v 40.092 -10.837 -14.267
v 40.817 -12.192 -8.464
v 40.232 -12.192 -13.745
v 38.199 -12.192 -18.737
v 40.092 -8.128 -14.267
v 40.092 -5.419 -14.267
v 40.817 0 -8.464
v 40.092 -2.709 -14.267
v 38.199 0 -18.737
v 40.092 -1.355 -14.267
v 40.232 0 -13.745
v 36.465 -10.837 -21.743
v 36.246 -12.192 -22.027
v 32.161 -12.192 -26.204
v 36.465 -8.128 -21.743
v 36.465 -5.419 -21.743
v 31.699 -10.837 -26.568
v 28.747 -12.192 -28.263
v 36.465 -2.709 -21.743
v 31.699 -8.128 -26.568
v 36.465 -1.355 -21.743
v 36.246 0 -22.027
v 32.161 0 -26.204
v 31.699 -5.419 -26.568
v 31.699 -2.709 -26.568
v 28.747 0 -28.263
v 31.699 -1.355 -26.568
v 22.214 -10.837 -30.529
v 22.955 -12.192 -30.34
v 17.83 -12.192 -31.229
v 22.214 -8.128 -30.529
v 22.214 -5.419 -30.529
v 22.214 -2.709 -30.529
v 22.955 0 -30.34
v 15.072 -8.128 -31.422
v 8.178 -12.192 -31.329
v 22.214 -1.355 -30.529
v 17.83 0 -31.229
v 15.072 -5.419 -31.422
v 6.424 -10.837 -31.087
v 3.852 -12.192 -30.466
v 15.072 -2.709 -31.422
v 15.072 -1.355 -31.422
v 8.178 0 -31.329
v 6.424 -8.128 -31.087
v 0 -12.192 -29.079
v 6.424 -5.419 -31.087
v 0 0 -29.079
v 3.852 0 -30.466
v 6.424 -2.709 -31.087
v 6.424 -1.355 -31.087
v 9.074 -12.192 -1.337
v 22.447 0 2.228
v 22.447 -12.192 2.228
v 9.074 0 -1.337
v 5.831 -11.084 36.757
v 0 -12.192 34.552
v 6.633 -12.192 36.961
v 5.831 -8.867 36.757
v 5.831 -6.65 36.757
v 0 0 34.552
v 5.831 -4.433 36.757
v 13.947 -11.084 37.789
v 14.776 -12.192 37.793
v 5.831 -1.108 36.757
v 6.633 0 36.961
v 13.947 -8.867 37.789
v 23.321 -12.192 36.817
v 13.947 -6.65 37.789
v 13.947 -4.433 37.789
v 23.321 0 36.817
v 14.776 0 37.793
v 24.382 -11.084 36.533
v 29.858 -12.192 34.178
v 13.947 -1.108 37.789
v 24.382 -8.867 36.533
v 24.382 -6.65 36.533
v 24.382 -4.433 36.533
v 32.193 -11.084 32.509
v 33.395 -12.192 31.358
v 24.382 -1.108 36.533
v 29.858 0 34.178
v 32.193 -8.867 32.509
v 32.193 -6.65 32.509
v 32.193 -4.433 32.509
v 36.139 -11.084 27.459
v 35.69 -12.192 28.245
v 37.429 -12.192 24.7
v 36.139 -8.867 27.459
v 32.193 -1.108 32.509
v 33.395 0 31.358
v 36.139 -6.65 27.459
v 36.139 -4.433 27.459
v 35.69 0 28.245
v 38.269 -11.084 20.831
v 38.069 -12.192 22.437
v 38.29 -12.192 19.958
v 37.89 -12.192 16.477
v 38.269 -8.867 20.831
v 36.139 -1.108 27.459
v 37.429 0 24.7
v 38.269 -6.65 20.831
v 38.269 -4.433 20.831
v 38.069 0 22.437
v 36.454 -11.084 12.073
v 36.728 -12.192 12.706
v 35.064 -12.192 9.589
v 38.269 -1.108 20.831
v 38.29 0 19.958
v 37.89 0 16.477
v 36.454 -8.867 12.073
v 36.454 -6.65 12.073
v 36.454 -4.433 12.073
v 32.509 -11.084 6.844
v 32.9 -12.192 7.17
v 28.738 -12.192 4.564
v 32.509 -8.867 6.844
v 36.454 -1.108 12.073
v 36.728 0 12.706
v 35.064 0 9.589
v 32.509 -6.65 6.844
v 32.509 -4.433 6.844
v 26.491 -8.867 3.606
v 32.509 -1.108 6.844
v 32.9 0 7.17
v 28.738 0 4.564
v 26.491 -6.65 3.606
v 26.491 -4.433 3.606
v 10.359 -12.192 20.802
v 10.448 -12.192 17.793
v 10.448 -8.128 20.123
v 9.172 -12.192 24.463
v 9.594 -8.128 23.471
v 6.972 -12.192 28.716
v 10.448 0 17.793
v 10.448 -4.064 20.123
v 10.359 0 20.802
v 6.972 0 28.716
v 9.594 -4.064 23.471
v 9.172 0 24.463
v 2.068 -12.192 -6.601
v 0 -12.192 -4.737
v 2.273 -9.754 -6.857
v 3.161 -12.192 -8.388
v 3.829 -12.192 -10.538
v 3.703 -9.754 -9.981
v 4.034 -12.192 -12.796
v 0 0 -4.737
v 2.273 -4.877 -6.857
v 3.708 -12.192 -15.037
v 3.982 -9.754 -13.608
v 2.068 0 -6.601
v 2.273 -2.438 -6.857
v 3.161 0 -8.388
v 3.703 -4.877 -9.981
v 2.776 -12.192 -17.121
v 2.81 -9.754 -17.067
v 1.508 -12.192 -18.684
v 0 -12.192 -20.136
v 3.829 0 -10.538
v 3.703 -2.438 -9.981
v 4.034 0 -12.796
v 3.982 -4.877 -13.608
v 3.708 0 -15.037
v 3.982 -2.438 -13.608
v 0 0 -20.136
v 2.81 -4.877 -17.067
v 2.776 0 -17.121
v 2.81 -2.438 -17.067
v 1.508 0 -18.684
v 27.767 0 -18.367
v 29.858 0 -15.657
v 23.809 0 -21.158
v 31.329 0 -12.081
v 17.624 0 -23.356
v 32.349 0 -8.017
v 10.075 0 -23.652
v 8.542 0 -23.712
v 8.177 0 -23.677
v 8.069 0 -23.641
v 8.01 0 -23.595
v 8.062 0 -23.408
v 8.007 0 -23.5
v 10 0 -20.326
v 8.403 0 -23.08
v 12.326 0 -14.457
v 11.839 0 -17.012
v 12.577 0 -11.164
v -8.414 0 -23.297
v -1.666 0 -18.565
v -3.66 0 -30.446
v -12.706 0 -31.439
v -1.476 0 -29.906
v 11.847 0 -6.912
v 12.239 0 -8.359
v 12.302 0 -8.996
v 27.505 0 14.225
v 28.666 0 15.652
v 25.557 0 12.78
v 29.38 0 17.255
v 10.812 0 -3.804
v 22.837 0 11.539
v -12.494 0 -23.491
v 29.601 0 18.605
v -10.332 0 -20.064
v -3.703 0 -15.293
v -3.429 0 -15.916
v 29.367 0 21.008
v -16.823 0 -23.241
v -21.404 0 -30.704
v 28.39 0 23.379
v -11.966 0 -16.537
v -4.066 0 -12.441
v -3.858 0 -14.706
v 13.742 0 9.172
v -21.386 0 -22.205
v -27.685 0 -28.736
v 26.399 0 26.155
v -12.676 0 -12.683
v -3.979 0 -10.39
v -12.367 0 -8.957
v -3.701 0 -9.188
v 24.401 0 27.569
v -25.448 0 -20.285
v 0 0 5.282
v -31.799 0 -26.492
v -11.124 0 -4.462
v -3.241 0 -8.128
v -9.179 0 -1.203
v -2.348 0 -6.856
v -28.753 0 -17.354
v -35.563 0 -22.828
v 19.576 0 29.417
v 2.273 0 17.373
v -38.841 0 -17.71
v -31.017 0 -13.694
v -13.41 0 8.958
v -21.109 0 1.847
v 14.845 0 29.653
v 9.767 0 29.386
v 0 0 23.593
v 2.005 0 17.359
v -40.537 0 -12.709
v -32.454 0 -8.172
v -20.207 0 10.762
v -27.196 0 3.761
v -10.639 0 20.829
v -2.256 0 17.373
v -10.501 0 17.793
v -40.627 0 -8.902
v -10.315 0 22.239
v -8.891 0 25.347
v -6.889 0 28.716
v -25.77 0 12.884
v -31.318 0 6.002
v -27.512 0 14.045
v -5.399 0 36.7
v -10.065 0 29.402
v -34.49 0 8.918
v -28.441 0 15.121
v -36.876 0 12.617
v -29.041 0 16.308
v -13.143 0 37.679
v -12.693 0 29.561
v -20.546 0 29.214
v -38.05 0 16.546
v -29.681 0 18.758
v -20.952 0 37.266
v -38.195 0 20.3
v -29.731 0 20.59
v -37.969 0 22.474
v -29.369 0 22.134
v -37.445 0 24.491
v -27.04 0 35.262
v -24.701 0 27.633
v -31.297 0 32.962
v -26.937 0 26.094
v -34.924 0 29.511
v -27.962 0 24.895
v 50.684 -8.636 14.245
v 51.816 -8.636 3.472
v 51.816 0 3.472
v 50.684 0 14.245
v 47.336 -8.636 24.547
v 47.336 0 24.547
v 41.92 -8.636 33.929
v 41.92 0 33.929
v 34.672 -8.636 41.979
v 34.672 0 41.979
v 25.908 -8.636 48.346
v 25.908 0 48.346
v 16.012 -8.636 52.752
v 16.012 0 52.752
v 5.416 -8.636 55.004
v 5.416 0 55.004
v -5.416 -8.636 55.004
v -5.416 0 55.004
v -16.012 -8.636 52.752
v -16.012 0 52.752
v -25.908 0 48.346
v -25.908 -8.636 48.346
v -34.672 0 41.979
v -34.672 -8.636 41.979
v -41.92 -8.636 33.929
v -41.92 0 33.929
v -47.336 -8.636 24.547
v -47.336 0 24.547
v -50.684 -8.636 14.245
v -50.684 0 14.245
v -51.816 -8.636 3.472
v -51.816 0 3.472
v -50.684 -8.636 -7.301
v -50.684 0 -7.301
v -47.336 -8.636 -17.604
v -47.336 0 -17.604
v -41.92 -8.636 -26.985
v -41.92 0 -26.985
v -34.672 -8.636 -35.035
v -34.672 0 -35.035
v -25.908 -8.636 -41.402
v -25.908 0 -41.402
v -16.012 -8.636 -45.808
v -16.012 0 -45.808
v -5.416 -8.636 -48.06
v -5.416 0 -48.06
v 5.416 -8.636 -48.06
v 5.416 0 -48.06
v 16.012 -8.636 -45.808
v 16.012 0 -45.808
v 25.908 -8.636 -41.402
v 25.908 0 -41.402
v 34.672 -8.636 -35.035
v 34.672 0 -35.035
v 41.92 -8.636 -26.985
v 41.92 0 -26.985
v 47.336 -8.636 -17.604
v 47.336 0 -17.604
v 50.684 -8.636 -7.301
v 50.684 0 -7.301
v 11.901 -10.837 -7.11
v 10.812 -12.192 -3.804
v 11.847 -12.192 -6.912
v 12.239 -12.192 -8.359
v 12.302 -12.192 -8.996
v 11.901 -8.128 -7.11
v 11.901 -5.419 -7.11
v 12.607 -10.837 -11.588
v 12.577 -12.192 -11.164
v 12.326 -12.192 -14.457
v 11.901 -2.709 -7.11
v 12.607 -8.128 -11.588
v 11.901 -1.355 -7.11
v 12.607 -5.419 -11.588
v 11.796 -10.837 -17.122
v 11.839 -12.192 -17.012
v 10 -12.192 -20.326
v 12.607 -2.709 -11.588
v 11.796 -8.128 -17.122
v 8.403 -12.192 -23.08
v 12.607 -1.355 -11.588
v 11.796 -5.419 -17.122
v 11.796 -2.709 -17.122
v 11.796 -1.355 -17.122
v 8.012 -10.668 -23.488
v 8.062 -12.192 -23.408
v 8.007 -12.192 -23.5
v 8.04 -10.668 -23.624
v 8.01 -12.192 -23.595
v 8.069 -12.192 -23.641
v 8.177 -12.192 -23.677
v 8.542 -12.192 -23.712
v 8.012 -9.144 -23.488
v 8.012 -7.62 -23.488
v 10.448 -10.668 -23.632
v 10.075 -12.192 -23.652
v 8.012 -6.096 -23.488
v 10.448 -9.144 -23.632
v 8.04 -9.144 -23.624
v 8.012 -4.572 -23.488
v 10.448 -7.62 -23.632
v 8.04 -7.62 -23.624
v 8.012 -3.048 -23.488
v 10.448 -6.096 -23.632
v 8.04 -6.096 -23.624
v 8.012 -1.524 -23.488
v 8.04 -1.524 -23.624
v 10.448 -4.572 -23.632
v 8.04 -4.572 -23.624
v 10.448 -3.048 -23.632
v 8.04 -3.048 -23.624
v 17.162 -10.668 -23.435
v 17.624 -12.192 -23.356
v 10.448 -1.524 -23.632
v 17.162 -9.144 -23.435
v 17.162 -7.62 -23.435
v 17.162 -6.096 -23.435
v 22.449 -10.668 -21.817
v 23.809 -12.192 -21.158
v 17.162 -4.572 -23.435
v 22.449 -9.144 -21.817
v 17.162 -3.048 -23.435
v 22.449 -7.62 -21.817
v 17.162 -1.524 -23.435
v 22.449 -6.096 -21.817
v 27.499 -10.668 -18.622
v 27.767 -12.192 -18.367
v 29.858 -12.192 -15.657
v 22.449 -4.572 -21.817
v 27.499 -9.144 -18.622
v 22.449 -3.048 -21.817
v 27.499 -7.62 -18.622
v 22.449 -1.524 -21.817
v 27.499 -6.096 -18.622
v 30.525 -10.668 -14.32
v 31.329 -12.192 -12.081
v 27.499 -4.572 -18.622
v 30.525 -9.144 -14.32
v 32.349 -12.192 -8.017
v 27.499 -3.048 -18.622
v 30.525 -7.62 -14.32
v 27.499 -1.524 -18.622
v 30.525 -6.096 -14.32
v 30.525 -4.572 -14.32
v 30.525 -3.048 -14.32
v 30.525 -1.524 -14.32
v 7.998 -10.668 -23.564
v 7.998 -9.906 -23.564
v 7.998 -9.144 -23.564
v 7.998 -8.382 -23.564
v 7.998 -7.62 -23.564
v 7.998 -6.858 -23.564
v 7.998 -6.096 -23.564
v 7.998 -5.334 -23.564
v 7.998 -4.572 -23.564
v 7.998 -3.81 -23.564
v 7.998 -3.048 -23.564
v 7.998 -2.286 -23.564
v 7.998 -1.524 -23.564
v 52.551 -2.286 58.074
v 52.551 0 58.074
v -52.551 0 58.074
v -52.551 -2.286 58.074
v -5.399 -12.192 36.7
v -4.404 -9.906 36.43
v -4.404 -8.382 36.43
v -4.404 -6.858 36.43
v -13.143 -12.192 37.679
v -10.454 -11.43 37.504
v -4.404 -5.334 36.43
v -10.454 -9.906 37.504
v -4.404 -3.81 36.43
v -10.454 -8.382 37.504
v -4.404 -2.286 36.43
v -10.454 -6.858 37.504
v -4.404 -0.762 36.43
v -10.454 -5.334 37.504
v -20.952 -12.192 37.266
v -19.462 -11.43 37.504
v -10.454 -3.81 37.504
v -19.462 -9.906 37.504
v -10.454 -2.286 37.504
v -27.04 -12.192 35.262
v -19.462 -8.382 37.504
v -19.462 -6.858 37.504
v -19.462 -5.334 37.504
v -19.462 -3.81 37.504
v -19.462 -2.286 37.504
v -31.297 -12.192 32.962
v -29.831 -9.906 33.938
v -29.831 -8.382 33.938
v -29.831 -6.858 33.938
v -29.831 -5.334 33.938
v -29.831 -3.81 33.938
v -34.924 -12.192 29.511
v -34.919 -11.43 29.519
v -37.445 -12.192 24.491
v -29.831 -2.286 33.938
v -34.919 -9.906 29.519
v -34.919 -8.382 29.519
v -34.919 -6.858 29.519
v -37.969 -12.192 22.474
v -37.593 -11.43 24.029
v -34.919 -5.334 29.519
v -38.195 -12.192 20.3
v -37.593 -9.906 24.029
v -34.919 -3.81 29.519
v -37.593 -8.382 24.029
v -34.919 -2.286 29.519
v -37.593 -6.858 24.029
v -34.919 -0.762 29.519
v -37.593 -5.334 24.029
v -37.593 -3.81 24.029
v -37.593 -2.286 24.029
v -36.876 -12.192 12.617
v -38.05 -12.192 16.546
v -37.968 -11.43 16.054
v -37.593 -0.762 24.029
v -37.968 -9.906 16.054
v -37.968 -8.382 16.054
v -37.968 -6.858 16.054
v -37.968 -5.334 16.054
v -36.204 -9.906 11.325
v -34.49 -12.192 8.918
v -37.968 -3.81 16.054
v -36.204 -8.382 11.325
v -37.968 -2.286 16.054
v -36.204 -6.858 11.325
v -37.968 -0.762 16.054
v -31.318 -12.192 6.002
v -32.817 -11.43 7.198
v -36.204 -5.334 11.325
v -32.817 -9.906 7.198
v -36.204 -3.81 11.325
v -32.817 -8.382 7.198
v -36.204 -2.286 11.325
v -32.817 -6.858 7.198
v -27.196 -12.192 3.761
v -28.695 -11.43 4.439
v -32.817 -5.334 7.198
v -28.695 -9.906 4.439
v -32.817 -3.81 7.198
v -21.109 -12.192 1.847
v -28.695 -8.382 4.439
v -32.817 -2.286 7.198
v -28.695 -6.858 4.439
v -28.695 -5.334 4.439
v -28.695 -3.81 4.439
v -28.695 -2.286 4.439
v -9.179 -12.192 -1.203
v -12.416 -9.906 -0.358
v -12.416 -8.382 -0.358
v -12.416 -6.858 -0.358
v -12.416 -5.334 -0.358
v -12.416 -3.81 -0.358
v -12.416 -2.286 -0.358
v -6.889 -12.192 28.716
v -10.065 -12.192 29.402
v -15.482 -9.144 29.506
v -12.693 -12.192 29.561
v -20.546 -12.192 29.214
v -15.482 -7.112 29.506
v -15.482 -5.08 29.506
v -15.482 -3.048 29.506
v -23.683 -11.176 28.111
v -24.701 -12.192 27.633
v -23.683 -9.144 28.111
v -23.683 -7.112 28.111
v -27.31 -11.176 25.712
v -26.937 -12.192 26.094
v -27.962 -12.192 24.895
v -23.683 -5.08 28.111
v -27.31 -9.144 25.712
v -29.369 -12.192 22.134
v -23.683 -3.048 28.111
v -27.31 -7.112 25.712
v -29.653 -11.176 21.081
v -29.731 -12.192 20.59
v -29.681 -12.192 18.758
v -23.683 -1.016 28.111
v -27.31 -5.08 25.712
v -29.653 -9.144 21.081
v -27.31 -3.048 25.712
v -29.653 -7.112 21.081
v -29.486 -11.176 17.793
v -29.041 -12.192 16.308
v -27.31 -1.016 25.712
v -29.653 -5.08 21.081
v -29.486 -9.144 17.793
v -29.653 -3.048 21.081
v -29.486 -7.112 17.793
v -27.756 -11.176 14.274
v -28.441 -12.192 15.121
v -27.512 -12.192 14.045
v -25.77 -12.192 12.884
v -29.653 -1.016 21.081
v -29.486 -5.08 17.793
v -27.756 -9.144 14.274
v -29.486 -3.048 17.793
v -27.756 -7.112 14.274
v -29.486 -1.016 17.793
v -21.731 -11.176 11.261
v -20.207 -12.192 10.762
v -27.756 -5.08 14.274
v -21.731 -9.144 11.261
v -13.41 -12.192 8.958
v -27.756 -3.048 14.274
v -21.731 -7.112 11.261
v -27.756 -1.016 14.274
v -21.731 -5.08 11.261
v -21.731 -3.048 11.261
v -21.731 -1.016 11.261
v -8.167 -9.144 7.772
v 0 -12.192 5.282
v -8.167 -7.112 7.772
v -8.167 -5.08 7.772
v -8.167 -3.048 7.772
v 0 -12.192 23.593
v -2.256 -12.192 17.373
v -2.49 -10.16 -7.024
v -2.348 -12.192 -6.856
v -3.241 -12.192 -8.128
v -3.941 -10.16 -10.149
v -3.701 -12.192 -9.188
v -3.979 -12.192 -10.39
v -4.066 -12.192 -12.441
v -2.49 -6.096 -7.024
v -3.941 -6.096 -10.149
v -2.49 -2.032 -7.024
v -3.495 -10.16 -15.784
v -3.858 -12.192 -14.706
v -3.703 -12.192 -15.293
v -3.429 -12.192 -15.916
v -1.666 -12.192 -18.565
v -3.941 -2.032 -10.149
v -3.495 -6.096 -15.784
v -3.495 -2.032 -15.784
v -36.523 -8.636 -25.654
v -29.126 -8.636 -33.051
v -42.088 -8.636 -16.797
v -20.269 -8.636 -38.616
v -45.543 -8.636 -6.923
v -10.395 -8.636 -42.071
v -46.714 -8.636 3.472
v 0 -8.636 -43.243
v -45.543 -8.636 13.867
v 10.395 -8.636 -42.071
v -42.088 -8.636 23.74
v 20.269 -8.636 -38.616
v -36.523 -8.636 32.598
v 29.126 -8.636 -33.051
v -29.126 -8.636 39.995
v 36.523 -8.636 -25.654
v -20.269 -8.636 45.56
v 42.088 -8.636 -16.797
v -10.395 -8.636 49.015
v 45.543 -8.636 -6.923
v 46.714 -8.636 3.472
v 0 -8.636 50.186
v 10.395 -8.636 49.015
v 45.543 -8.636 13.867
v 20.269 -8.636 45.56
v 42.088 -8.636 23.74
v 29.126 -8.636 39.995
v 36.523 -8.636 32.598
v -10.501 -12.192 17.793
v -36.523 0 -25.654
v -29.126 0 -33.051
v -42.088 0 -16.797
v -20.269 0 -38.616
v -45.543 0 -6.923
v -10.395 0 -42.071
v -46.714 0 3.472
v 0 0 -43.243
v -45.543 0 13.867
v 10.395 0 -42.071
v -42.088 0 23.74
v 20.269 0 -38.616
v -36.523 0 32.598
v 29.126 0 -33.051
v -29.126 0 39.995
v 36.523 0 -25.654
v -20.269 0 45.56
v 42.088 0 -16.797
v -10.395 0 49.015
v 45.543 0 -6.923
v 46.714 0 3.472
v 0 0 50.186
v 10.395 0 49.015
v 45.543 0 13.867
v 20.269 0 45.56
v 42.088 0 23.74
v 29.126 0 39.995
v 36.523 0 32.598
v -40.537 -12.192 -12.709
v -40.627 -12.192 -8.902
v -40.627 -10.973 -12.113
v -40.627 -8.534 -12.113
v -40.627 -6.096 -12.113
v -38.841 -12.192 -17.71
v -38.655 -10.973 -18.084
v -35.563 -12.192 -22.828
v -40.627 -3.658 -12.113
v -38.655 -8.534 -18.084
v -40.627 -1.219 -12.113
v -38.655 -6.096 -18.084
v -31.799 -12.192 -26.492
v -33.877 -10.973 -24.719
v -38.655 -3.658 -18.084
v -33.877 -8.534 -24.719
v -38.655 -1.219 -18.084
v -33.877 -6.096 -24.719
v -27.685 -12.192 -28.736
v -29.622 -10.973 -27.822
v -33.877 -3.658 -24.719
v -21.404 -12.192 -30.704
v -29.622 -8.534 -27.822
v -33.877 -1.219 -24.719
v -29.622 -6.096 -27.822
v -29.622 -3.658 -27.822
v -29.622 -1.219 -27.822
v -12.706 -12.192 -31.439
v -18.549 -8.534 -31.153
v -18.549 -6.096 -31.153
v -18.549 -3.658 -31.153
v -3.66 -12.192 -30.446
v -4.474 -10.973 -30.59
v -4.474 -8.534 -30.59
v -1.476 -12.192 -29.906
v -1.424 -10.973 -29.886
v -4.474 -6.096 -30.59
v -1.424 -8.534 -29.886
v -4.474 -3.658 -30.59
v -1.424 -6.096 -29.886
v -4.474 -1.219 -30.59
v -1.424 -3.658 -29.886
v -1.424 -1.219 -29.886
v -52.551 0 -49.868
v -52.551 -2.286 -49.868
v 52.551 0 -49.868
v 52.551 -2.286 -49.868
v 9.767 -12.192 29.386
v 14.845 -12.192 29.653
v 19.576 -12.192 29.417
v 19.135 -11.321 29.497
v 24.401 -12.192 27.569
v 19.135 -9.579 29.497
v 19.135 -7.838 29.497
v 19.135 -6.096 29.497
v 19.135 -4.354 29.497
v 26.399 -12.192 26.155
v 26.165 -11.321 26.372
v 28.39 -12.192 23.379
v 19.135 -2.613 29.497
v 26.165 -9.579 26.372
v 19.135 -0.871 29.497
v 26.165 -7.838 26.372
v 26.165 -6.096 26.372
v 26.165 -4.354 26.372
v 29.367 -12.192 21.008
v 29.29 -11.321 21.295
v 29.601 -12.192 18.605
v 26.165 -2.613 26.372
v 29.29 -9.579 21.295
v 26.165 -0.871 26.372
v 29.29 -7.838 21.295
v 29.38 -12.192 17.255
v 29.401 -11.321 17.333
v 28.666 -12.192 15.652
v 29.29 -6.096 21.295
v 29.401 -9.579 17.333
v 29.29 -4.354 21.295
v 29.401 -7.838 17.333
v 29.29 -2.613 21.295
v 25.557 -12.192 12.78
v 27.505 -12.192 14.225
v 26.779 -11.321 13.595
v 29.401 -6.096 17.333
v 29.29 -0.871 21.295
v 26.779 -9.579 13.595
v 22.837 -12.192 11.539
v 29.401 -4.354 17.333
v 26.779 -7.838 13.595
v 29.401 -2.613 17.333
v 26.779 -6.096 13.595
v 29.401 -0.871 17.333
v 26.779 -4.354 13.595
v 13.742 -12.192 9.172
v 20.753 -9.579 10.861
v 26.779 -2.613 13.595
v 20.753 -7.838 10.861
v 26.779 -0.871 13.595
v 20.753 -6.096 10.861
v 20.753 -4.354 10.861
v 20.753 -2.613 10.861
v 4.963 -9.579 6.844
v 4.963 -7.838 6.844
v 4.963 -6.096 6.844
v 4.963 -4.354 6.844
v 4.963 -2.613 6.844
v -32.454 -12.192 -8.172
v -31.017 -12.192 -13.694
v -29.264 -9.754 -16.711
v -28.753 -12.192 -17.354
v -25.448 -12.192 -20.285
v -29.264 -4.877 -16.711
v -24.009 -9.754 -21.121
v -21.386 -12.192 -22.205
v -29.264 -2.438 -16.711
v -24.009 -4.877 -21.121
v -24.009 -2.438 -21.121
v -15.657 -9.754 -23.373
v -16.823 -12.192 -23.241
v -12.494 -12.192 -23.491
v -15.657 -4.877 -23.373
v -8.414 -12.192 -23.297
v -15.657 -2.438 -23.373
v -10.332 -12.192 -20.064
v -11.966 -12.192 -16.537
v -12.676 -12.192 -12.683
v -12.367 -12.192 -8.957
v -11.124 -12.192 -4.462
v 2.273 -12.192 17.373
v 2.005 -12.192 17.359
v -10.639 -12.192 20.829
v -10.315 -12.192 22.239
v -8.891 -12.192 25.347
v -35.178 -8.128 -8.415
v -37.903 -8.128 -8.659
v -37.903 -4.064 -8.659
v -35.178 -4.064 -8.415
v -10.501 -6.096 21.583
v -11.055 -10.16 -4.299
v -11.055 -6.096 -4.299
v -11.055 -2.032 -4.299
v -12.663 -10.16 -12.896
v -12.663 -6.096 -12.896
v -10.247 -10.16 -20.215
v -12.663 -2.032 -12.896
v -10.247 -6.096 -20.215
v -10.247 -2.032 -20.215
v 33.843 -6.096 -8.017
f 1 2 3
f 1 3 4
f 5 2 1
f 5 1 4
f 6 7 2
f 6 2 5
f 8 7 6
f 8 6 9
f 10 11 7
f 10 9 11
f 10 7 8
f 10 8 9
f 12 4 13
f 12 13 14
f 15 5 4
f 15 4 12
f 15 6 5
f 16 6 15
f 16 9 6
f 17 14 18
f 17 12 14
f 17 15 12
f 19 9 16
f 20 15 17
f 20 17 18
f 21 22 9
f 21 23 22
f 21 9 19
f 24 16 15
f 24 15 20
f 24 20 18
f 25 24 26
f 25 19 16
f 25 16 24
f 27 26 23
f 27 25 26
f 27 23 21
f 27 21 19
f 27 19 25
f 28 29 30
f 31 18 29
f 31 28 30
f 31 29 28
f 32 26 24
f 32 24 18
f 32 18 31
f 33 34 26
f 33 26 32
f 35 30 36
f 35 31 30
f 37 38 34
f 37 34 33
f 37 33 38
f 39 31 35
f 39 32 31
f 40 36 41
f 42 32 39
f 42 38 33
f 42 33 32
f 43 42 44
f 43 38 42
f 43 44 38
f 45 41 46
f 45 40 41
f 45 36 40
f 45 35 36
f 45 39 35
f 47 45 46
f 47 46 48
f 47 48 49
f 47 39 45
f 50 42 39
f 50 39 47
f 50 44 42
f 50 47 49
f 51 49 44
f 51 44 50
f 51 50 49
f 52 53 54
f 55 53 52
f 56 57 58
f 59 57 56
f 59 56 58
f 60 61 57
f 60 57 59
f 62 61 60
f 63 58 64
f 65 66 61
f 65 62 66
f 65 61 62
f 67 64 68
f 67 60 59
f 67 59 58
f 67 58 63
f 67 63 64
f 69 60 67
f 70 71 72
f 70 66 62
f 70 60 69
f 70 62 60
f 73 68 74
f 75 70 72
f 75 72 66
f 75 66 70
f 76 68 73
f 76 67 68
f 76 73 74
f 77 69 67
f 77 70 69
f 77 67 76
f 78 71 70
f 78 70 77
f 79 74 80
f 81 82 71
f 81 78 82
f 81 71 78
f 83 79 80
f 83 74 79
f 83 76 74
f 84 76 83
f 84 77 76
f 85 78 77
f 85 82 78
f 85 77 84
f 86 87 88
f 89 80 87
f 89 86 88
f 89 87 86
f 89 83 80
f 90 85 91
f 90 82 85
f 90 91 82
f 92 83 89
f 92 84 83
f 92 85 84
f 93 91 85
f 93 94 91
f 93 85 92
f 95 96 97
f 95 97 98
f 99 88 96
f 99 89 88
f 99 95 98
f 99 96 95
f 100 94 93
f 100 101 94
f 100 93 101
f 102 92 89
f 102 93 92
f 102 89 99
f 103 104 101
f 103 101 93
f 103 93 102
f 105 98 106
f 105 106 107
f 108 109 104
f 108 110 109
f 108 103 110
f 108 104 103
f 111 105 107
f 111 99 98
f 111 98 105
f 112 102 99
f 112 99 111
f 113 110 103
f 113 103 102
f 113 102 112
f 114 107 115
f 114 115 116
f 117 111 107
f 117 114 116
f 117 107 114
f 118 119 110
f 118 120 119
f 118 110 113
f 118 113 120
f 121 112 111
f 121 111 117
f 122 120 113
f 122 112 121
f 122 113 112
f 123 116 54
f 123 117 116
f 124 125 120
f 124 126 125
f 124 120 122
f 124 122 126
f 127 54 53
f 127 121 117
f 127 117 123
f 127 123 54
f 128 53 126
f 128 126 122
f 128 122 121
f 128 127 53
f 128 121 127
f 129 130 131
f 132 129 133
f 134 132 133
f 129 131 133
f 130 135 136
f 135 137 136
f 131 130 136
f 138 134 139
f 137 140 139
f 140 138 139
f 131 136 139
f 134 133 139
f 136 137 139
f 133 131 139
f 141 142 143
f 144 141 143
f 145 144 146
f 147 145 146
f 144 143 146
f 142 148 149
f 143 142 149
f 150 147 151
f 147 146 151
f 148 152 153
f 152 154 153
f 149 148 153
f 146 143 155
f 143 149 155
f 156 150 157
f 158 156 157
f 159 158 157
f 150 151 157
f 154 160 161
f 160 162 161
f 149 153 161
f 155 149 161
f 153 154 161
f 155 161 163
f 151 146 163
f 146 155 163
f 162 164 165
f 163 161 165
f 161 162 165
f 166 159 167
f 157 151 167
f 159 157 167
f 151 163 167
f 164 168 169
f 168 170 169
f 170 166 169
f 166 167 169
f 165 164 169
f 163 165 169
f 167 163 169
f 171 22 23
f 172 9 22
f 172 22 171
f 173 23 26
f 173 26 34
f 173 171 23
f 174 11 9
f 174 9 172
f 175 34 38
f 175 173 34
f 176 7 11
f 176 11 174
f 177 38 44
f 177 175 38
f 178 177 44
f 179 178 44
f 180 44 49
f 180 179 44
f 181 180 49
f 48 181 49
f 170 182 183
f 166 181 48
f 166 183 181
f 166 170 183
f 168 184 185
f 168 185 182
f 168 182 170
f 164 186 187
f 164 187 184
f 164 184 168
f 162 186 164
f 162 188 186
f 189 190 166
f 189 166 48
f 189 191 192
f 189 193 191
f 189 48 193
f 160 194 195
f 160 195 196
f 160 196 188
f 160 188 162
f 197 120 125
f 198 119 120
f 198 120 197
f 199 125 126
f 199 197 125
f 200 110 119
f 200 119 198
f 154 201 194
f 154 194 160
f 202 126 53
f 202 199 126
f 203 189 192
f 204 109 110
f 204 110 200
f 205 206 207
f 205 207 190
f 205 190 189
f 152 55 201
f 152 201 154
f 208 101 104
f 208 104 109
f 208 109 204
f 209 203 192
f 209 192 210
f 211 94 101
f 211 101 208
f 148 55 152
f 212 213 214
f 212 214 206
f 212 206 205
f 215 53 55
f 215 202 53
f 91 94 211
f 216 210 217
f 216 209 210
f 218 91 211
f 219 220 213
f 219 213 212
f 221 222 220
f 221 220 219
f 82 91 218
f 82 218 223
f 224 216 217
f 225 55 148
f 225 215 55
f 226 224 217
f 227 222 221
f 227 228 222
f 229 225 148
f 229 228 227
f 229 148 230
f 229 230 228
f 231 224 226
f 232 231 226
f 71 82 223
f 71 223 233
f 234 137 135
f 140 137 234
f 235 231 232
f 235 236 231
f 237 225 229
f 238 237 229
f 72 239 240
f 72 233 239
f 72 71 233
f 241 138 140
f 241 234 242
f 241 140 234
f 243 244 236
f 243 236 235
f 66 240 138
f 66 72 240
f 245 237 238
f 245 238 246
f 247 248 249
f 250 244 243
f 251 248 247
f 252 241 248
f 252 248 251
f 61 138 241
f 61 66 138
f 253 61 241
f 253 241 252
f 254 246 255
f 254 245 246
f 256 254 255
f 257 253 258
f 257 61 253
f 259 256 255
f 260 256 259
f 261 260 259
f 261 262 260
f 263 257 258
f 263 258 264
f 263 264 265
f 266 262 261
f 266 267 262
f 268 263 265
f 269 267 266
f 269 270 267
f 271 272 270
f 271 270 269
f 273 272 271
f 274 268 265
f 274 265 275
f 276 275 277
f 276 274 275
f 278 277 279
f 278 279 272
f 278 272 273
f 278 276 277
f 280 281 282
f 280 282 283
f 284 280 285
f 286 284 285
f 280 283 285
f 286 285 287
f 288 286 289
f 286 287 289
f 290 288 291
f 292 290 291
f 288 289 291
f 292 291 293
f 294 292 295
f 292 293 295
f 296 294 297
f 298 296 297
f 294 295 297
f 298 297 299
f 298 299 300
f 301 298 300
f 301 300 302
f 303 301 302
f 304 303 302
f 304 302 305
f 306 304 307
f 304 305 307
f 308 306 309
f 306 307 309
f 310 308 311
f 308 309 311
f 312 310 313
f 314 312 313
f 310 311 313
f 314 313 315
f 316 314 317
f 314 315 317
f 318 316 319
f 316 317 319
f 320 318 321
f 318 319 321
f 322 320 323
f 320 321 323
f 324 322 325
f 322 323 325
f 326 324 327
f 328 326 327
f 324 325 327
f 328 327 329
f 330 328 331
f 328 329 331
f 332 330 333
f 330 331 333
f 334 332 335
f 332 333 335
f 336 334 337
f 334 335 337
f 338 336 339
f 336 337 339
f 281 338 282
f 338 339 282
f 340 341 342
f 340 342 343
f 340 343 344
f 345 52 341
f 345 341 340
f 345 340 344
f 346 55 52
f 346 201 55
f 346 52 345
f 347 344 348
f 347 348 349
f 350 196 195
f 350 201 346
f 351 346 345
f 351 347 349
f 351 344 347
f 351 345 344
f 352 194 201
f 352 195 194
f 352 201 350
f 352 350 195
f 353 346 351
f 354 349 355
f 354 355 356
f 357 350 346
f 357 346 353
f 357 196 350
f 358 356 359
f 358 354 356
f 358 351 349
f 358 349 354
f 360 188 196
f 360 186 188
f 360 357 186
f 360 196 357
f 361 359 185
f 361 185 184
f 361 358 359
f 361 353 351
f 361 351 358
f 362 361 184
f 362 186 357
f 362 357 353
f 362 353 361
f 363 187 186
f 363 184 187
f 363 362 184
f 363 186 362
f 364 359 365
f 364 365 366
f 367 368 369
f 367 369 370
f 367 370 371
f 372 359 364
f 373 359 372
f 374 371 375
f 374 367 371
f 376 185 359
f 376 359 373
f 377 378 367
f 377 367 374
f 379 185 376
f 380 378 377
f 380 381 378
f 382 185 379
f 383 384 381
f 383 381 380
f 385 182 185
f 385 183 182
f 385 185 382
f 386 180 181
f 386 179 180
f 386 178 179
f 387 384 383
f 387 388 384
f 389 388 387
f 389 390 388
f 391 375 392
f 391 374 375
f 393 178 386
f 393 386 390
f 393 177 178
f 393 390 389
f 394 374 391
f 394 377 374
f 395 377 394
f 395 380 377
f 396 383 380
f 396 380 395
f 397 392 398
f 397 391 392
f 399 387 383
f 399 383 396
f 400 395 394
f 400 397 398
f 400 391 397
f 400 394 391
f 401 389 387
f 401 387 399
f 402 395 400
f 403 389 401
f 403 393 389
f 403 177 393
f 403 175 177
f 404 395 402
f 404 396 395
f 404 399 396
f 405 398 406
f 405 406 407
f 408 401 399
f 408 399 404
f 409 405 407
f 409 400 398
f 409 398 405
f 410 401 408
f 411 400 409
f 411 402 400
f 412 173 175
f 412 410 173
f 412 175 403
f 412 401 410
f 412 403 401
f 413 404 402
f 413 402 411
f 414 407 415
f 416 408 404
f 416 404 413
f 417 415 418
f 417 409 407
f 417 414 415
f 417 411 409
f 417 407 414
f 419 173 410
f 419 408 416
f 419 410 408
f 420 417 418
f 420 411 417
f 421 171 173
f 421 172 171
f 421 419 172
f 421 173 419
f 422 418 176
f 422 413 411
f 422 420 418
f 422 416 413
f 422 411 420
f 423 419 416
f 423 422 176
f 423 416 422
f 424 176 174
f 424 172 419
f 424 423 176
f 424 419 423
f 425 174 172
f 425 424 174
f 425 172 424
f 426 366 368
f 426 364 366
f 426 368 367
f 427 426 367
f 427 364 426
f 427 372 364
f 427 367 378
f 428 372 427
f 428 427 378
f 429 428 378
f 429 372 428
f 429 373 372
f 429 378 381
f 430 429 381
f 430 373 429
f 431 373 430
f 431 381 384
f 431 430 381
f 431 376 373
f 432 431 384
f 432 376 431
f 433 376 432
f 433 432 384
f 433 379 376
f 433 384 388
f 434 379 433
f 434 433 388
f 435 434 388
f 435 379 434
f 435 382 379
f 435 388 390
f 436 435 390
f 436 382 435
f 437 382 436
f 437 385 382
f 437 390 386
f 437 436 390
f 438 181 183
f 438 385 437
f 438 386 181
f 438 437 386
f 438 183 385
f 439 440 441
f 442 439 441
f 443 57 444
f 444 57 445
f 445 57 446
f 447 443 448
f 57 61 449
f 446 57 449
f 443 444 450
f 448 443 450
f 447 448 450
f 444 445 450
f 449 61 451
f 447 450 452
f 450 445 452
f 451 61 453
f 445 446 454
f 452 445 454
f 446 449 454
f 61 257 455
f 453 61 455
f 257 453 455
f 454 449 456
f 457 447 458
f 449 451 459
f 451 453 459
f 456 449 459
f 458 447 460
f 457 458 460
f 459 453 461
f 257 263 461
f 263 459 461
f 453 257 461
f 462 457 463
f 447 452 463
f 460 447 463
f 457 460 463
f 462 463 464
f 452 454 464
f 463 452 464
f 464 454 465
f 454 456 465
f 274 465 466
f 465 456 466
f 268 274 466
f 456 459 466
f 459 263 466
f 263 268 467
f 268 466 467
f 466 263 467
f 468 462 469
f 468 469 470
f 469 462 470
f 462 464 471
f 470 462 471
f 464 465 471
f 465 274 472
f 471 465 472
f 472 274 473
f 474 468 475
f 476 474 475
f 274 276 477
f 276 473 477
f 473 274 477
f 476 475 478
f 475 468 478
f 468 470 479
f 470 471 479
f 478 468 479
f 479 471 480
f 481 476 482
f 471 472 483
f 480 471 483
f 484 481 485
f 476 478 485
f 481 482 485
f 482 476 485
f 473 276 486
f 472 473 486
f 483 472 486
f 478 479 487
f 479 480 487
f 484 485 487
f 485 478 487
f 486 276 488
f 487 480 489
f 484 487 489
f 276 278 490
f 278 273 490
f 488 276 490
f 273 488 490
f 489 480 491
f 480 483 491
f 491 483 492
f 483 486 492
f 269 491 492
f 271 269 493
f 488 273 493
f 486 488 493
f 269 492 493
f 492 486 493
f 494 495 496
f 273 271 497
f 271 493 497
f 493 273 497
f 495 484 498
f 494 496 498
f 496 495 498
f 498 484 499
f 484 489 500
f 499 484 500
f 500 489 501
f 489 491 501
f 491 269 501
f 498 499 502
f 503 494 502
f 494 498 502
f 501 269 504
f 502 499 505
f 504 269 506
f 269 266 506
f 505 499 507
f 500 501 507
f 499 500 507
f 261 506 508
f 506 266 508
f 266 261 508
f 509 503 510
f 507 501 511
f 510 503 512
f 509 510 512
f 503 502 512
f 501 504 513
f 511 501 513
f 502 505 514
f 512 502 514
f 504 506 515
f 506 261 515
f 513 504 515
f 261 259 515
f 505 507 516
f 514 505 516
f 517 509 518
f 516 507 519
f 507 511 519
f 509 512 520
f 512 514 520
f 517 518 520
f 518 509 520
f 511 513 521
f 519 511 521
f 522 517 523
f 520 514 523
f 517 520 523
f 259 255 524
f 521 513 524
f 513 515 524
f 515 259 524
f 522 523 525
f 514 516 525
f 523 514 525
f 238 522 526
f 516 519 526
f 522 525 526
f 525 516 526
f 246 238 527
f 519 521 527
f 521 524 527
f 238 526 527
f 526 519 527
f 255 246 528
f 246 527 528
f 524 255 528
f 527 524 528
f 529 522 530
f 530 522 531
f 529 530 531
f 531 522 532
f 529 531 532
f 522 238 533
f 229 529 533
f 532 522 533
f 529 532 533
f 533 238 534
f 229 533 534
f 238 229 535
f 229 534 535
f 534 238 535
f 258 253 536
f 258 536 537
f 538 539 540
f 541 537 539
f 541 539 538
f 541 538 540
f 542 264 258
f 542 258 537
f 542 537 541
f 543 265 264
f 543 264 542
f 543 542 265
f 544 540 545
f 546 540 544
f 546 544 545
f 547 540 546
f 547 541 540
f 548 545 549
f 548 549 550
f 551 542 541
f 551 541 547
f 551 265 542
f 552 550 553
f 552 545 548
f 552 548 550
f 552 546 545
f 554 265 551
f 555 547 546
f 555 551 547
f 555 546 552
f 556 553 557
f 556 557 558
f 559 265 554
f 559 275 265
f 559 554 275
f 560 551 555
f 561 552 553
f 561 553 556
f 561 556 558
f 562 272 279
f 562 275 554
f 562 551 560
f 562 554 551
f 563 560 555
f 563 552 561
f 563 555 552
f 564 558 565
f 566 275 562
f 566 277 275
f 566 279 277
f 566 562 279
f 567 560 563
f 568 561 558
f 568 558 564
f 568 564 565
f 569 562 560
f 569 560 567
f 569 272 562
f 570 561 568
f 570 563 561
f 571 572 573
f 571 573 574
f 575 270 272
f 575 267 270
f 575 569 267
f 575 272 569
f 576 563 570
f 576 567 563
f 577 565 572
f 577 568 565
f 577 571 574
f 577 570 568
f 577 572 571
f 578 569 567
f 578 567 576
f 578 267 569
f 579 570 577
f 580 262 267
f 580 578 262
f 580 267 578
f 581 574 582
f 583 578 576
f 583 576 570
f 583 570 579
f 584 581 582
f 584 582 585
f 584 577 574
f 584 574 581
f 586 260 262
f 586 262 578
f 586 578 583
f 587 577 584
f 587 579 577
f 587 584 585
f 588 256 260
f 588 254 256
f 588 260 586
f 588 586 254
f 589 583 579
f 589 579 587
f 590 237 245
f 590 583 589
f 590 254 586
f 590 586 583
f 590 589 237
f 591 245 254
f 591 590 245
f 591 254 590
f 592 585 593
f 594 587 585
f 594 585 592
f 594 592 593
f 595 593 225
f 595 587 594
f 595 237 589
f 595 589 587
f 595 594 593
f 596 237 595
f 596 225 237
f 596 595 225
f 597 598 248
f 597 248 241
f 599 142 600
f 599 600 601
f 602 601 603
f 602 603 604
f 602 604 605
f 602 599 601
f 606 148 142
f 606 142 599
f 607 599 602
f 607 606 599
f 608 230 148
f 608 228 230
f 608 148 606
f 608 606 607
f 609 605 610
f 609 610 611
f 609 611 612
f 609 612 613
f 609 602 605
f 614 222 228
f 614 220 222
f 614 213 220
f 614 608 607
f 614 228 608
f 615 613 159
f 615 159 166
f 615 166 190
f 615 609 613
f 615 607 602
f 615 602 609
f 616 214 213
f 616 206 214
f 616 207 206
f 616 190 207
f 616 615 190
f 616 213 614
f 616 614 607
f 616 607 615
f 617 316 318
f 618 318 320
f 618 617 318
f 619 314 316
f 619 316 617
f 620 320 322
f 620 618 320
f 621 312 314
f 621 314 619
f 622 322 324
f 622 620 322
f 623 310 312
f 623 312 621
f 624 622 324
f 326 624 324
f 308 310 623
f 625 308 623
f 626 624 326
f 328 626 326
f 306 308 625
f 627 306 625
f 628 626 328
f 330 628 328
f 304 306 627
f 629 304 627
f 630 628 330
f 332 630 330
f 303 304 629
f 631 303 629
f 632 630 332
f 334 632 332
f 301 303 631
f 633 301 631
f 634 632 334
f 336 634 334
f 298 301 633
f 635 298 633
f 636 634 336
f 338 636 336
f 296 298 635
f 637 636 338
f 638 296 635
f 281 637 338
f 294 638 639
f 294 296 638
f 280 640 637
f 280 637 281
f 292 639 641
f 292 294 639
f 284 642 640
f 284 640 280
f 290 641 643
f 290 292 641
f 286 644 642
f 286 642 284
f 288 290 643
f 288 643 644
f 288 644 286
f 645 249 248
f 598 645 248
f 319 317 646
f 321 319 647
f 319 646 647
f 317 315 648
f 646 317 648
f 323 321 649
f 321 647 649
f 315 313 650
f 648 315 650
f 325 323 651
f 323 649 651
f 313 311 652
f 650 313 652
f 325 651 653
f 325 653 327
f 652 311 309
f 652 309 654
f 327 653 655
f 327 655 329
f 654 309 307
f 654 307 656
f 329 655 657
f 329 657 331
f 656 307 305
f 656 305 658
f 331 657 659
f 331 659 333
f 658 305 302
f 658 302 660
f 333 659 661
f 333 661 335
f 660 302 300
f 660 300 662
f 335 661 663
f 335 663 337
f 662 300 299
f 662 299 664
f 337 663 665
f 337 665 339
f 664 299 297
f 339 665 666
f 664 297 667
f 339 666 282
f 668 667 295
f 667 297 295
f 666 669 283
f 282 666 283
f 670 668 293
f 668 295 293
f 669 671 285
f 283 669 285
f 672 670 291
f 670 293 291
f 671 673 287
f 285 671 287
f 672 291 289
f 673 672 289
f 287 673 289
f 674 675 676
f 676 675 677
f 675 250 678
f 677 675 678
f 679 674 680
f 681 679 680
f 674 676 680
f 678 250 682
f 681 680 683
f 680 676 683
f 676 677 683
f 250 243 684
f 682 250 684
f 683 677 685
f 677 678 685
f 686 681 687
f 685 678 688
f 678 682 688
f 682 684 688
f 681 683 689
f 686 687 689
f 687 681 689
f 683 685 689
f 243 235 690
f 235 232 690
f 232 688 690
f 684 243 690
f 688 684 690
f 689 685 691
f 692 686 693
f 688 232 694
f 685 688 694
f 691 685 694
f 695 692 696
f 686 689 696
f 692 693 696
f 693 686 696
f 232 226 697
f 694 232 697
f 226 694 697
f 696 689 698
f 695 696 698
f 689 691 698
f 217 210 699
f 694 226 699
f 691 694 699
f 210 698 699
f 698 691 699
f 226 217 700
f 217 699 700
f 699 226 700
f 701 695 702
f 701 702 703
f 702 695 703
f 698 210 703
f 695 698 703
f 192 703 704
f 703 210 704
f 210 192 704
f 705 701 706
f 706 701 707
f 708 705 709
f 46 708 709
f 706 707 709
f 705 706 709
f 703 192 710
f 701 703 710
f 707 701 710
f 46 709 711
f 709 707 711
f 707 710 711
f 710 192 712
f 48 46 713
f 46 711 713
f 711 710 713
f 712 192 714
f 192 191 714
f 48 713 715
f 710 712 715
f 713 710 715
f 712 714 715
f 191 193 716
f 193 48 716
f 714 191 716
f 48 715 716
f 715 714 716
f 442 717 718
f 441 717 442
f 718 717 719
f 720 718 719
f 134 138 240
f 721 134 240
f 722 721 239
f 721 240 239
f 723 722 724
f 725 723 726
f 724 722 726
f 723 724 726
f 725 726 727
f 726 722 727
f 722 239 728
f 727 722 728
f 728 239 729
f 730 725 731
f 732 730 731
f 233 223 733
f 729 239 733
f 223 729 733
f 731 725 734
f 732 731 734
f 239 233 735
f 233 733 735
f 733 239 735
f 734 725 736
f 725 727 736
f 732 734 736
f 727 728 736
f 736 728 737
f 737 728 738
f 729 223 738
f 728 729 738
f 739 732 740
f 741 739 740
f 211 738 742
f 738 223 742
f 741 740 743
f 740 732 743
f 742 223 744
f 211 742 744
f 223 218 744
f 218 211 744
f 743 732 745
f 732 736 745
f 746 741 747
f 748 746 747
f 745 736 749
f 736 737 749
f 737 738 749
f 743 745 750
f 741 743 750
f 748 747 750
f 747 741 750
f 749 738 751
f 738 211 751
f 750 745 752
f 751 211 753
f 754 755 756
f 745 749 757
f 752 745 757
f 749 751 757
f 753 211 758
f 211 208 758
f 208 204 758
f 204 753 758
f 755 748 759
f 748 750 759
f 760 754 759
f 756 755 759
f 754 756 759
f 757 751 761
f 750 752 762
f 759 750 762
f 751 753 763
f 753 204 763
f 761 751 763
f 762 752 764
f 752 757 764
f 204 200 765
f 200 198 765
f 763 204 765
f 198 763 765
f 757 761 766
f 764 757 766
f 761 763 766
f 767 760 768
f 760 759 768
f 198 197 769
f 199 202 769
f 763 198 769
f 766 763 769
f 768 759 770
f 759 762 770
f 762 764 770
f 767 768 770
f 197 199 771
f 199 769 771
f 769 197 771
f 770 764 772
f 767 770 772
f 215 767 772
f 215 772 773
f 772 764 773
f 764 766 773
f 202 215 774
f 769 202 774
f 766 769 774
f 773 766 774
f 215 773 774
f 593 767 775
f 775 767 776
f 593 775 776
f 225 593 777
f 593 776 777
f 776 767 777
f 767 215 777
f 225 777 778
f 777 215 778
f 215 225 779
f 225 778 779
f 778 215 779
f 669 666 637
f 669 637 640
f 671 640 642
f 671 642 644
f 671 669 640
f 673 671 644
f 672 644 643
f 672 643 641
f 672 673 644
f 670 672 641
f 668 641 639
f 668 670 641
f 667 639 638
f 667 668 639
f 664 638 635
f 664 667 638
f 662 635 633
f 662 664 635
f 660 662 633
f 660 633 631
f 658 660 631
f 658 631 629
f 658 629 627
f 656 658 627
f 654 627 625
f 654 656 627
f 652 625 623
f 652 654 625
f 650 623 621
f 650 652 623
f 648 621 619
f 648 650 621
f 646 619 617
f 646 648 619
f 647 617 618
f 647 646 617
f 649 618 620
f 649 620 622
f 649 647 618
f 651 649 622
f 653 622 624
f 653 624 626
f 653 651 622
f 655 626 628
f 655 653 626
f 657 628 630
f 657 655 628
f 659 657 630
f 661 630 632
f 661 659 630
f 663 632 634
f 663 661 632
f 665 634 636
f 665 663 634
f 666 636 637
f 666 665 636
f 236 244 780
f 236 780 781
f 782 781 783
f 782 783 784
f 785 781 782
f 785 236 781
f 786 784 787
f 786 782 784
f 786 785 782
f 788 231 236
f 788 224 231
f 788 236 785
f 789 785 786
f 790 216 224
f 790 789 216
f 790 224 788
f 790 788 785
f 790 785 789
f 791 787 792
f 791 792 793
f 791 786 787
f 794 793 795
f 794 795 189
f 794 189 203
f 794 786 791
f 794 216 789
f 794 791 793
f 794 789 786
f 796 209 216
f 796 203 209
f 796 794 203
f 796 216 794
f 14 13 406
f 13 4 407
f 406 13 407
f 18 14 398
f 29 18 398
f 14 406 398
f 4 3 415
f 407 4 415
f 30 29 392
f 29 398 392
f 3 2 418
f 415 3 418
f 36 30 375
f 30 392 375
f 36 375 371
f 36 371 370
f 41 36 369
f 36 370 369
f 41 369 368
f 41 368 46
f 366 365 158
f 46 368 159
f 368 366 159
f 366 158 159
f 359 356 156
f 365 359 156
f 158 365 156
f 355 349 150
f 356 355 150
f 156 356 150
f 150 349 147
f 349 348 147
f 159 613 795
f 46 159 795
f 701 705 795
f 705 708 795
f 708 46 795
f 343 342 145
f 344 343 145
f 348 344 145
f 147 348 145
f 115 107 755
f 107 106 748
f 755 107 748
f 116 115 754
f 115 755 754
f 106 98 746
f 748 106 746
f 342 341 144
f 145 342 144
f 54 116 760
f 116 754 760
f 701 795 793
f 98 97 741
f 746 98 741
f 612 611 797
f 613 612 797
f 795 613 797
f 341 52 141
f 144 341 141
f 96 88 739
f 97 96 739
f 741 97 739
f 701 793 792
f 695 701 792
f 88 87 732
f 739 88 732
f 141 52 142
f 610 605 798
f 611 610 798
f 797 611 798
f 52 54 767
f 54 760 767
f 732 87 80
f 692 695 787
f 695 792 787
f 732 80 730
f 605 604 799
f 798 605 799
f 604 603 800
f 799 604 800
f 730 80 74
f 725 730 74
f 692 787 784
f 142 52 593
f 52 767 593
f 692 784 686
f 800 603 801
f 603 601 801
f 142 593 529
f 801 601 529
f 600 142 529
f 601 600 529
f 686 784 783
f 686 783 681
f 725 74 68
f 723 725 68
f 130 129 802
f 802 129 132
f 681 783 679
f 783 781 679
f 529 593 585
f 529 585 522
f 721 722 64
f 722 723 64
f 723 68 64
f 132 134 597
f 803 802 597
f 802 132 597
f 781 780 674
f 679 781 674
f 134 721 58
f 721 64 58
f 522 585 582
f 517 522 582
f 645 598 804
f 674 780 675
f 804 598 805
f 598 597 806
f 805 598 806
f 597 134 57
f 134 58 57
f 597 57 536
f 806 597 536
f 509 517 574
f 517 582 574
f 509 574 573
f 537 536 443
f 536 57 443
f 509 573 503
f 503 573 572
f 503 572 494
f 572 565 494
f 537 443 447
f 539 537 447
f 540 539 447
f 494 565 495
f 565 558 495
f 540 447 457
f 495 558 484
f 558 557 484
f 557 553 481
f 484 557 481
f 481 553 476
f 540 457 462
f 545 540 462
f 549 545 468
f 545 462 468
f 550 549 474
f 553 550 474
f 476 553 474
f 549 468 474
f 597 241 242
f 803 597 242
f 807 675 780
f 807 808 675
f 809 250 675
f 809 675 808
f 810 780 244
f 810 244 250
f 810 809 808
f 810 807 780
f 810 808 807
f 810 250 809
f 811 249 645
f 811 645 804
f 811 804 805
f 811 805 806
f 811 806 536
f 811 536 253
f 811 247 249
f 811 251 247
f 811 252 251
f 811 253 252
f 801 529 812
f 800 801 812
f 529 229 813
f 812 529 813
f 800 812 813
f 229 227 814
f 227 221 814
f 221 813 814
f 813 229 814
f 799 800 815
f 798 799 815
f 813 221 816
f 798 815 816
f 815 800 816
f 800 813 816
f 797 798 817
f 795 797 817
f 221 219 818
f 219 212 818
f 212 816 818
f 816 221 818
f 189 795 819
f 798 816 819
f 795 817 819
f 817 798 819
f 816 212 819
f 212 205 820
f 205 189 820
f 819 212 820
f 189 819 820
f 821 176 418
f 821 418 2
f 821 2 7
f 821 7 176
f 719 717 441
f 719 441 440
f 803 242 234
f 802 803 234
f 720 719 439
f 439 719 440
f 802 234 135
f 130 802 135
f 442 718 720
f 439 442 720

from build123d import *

# Parameters (mm, degrees)
F2_DEPTH = 12.192
F0_R     = 51.8159960218
F0_R_2   = 46.7143522427
F3_DEPTH = 8.636
F4_W     = 52.550945431
F4_H     = 107.9424871132
F4_W_2   = 52.5509491563
F5_DEPTH = 2.286


with BuildPart() as f2:
    # F1 (on Front) → F2 (new body)
    with BuildSketch(Plane.XZ):
        with BuildLine():
            add(Edge.make_bspline(
                [(0, 34.5519892871), (1.8636551367, 35.3682879789), (5.8624587577, 37.1198020334), (14.0515556016, 38.1297289695), (24.4370441691, 37.1954468039), (32.5199308373, 33.0254458176), (36.3462355524, 27.5668970525), (39.1498419, 20.9074591969), (36.9325163196, 11.8163155109), (32.8908786108, 6.4767150827), (26.4048755311, 3.3673698207), (19.1638661043, 1.2345521392), (12.6152715008, -0.4342548338), (9.0735172853, -1.3368155342)],
                knots=[0, 0, 0, 0, 0.0808101023, 0.1733924498, 0.2783212058, 0.3742662381, 0.4562013177, 0.5416025842, 0.6384026023, 0.7212377579, 0.805849764, 0.8949954214, 1, 1, 1, 1], degree=3))
            add(Edge.make_bspline(
                [(0, 34.5519892871), (-1.1805786957, 35.154116431), (-3.870472007, 36.526034951), (-10.4373018154, 37.7453348505), (-19.5412992264, 37.8401527719), (-24.2904752801, 36.376923106), (-29.9273966235, 34.1635085314), (-32.458794007, 32.0066774867), (-35.2055331247, 29.7154093668), (-37.8890127864, 24.0553858061), (-38.2765328975, 20.1535652977), (-38.1940426413, 15.9507278176), (-36.5403337735, 11.2818749594), (-33.0079028254, 7.0104879258), (-28.7965620817, 4.2981589294), (-23.7264390156, 2.4003928514), (-12.5123644542, -0.3063020827), (-10.0439856054, -0.9700598603), (-9.1785937548, -1.202767482)],
                knots=[0, 0, 0, 0, 0.0553075256, 0.1260156088, 0.2075084565, 0.2692905852, 0.334803653, 0.3837999273, 0.4346266679, 0.5017260102, 0.5559412564, 0.6105276622, 0.6706208836, 0.7342253921, 0.7932745479, 0.8583421756, 0.9503360163, 1, 1, 1, 1], degree=3))
            add(Edge.make_bspline(
                [(-9.1785937548, -1.202767482), (-9.845001483, -2.1190641409), (-11.324834039, -4.153802889), (-12.5822585435, -9.5375499396), (-12.8170646598, -12.8275421798), (-12.0704327469, -16.8687144004), (-10.2854667918, -20.21715554), (-9.0312879882, -22.2811018337), (-8.4140896797, -23.2967976481)],
                knots=[0, 0, 0, 0, 0.1598677995, 0.3550042478, 0.5097927259, 0.6767124276, 0.8409058244, 1, 1, 1, 1], degree=3))
            add(Edge.make_bspline(
                [(-32.4539020658, -8.1718796864), (-32.2437107397, -9.468656053), (-31.7956531111, -12.2329496834), (-29.5062684828, -17.0606713529), (-24.250316111, -21.7487802231), (-15.6530451707, -23.778242598), (-10.7547209753, -23.452467222), (-8.4140896797, -23.2967976481)],
                knots=[0, 0, 0, 0, 0.1602092529, 0.3415125605, 0.550526587, 0.7852221505, 1, 1, 1, 1], degree=3))
            add(Edge.make_bspline(
                [(-40.6272262335, -8.9019350708), (-37.9027848442, -8.658583276), (-35.178343455, -8.4152314812), (-32.4539020658, -8.1718796864)],
                knots=[0, 0, 0, 0, 8.2058642942, 8.2058642942, 8.2058642942, 8.2058642942], degree=3))
            add(Edge.make_bspline(
                [(-40.6272262335, -8.9019350708), (-40.7039255948, -9.8997054018), (-40.8879573905, -12.2937470539), (-38.9887081595, -18.3667007665), (-34.1604688217, -24.9664170941), (-29.7808537842, -27.9540761907), (-24.4667808828, -30.0704043775), (-18.5901521679, -31.3941922774), (-10.1765970791, -31.5810424479), (-4.7144720713, -30.6312893302), (-1.4432548208, -30.0632820351), (-0.42666285, -29.3697934955), (0, -29.0787369013)],
                knots=[0, 0, 0, 0, 0.079258525, 0.1901722312, 0.3166448276, 0.4181510198, 0.5216121212, 0.6311902517, 0.7597432605, 0.8651567625, 0.9434063994, 1, 1, 1, 1], degree=3))
            add(Edge.make_bspline(
                [(40.8171638846, -8.4643382579), (40.7381572513, -10.3886347037), (40.5818547594, -14.1955597309), (37.8007214389, -19.4731405672), (36.6885201937, -21.7714592565), (31.7726372213, -27.0288617791), (27.6387825515, -28.7435724779), (22.102705484, -30.8435558294), (15.0800879875, -31.5581391259), (6.3556985515, -31.5670864848), (2.0280278434, -29.8727396688), (0, -29.0787369013)],
                knots=[0, 0, 0, 0, 0.1109520826, 0.219501658, 0.295270297, 0.4147541267, 0.5138746024, 0.6228956869, 0.7459859702, 0.8809642508, 1, 1, 1, 1], degree=3))
            add(Edge.make_bspline(
                [(32.3493741453, -8.0170677975), (32.7560172129, -8.0061735838), (34.0423102648, -7.9717130151), (38.0657065377, -8.2642693827), (40.8171638846, -8.4643382579)],
                knots=[0, 0, 0, 0, 0.3161356326, 1, 1, 1, 1], degree=3))
            add(Edge.make_bspline(
                [(8.4034176543, -23.0798069388), (8.1716431348, -23.2808839836), (7.489829636, -23.8723944038), (10.8184358189, -23.5426576033), (13.4294921878, -23.6565616212), (17.31872678, -23.639786504), (22.578698228, -22.0248367485), (27.7738699264, -18.9079301104), (30.8878578174, -14.426891942), (31.8445724527, -10.2309945362), (32.3493741453, -8.0170677975)],
                knots=[0, 0, 0, 0, 0.0513085494, 0.15093489, 0.2615075902, 0.3844275026, 0.5344029929, 0.6903308064, 0.8366058934, 1, 1, 1, 1], degree=3))
            add(Edge.make_bspline(
                [(9.0735172853, -1.3368155342), (9.7061423309, -2.0843355969), (11.0208680345, -3.6378369122), (11.8395221763, -6.9969320444), (12.3803559262, -8.7094847063), (12.2073156715, -9.4392341122), (12.870261523, -11.6740653845), (12.1583492165, -15.1253047377), (12.048928336, -17.1494410568), (9.6917273766, -20.7396116302), (8.8023141426, -22.3552174443), (8.4034176543, -23.0798069388)],
                knots=[0, 0, 0, 0, 0.1220706164, 0.2536879911, 0.344786687, 0.4021461329, 0.5068555032, 0.6386515479, 0.7406218126, 0.8836704424, 1, 1, 1, 1], degree=3))
        make_face()
        with BuildLine():
            add(Edge.make_bspline(
                [(0, -4.7366642393), (-0.8923299318, -5.4519225199), (-2.6853114951, -6.8891094444), (-4.2840151362, -9.9813507511), (-3.9756274703, -14.1751850766), (-3.6863272327, -15.7550905834), (-1.4658460314, -19.0345296128), (-0.4271764166, -19.8149706478), (0, -20.1359447092)],
                knots=[0, 0, 0, 0, 0.1784962071, 0.358657036, 0.5518544442, 0.6796134014, 0.868233751, 1, 1, 1, 1], degree=3))
            add(Edge.make_bspline(
                [(0, -4.7366642393), (0.8178810071, -5.3781655006), (2.4957424384, -6.6941885103), (3.895115331, -9.9620274658), (4.2231264624, -13.6337500787), (3.0799665013, -17.2831269958), (1.0487220782, -19.1645663127), (0, -20.1359447092)],
                knots=[0, 0, 0, 0, 0.1860691729, 0.3817160272, 0.583005201, 0.7847075186, 1, 1, 1, 1], degree=3))
        make_face(mode=Mode.SUBTRACT)
        with BuildLine():
            Line((-2.2555692121, 17.3729152447), (0, 23.5926937312))
            Line((0, 23.5926937312), (2.0053184126, 17.3591729254))
            Line((2.0053184126, 17.3591729254), (2.2726688347, 17.3729152447))
            Line((2.2726688347, 17.3729152447), (10.448188521, 17.7931524813))
            add(Edge.make_bspline(
                [(10.448188521, 17.7931524813), (10.4877243033, 18.5459923798), (10.5754023875, 20.2155574197), (9.7251992605, 23.6826678169), (7.9666868287, 26.8970323069), (6.9718230516, 28.7155322731)],
                knots=[0, 0, 0, 0, 0.2628765565, 0.5829785448, 1, 1, 1, 1], degree=3))
            add(Edge.make_bspline(
                [(6.9718230516, 28.7155322731), (7.8123734401, 28.9839837268), (9.627078595, 29.5635566395), (13.6825187364, 29.4927544947), (14.9575104412, 29.7176313033), (19.3674595149, 29.7442916027), (23.0439312051, 28.3186159994), (26.3217788275, 26.5939647856), (28.0571479735, 24.0335753571), (29.5261603856, 21.3606014643), (29.8859960024, 17.113140494), (26.9766146333, 13.0601828898), (20.6414514245, 10.5905711333), (12.6709386277, 9.0378098477), (5.0545437914, 6.9177483188), (1.5631505037, 5.7877597681), (0, 5.2818465047)],
                knots=[0, 0, 0, 0, 0.0584910726, 0.1262792243, 0.1671287521, 0.2373257254, 0.3077930861, 0.373119716, 0.432733923, 0.4927463323, 0.5614910927, 0.6352832911, 0.7241131949, 0.8240596834, 0.9212288127, 1, 1, 1, 1], degree=3))
            add(Edge.make_bspline(
                [(-6.8892352283, 28.7155322731), (-8.2201023484, 29.0519884309), (-10.939968843, 29.7395971462), (-15.4874221077, 29.4019447428), (-19.629830645, 29.6875242869), (-23.7654185994, 28.1817151748), (-27.6311121872, 26.1458904623), (-30.0736408894, 21.1209659438), (-29.5841508675, 17.796372585), (-28.2477362759, 13.6057723203), (-21.5480221345, 11.1141143145), (-15.2357151238, 9.2486950088), (-8.0484787217, 7.9257025042), (-2.757095886, 6.1875287772), (0, 5.2818465047)],
                knots=[0, 0, 0, 0, 0.0748027458, 0.1528728744, 0.2275069981, 0.3033961467, 0.3799753925, 0.4636384969, 0.5302703853, 0.6029906495, 0.6983101371, 0.7940598334, 0.8926940643, 1, 1, 1, 1], degree=3))
            add(Edge.make_bspline(
                [(-10.5011761189, 17.7931524813), (-10.6701858263, 18.980308082), (-11.084665299, 21.891688942), (-8.4497359083, 26.1773867244), (-6.8892352283, 28.7155322731)],
                knots=[0, 0, 0, 0, 0.4077637581, 1, 1, 1, 1], degree=3))
            Line((-10.5011761189, 17.7931524813), (-2.2555692121, 17.3729152447))
        make_face(mode=Mode.SUBTRACT)
    extrude(amount=F2_DEPTH)


with BuildPart() as f3:
    # F0 (on Front) → F3 (new body)
    with BuildSketch(Plane.XZ):
        with Locations((0, 3.4718343522)):
            Circle(F0_R)
        with Locations((0, 3.4718343522)):
            Circle(F0_R_2, mode=Mode.SUBTRACT)
    extrude(amount=F3_DEPTH)


with BuildPart() as f5:
    # F4 (on Front) → F5 (new body)
    with BuildSketch(Plane.XZ):
        with Locations((-26.2754727155, 4.1030771099)):
            Rectangle(F4_W, F4_H)
        with Locations((26.2754745781, 4.1030771099)):
            Rectangle(F4_W_2, F4_H)
    extrude(amount=F5_DEPTH)


solid = Compound([f2.part, f3.part, f5.part])
